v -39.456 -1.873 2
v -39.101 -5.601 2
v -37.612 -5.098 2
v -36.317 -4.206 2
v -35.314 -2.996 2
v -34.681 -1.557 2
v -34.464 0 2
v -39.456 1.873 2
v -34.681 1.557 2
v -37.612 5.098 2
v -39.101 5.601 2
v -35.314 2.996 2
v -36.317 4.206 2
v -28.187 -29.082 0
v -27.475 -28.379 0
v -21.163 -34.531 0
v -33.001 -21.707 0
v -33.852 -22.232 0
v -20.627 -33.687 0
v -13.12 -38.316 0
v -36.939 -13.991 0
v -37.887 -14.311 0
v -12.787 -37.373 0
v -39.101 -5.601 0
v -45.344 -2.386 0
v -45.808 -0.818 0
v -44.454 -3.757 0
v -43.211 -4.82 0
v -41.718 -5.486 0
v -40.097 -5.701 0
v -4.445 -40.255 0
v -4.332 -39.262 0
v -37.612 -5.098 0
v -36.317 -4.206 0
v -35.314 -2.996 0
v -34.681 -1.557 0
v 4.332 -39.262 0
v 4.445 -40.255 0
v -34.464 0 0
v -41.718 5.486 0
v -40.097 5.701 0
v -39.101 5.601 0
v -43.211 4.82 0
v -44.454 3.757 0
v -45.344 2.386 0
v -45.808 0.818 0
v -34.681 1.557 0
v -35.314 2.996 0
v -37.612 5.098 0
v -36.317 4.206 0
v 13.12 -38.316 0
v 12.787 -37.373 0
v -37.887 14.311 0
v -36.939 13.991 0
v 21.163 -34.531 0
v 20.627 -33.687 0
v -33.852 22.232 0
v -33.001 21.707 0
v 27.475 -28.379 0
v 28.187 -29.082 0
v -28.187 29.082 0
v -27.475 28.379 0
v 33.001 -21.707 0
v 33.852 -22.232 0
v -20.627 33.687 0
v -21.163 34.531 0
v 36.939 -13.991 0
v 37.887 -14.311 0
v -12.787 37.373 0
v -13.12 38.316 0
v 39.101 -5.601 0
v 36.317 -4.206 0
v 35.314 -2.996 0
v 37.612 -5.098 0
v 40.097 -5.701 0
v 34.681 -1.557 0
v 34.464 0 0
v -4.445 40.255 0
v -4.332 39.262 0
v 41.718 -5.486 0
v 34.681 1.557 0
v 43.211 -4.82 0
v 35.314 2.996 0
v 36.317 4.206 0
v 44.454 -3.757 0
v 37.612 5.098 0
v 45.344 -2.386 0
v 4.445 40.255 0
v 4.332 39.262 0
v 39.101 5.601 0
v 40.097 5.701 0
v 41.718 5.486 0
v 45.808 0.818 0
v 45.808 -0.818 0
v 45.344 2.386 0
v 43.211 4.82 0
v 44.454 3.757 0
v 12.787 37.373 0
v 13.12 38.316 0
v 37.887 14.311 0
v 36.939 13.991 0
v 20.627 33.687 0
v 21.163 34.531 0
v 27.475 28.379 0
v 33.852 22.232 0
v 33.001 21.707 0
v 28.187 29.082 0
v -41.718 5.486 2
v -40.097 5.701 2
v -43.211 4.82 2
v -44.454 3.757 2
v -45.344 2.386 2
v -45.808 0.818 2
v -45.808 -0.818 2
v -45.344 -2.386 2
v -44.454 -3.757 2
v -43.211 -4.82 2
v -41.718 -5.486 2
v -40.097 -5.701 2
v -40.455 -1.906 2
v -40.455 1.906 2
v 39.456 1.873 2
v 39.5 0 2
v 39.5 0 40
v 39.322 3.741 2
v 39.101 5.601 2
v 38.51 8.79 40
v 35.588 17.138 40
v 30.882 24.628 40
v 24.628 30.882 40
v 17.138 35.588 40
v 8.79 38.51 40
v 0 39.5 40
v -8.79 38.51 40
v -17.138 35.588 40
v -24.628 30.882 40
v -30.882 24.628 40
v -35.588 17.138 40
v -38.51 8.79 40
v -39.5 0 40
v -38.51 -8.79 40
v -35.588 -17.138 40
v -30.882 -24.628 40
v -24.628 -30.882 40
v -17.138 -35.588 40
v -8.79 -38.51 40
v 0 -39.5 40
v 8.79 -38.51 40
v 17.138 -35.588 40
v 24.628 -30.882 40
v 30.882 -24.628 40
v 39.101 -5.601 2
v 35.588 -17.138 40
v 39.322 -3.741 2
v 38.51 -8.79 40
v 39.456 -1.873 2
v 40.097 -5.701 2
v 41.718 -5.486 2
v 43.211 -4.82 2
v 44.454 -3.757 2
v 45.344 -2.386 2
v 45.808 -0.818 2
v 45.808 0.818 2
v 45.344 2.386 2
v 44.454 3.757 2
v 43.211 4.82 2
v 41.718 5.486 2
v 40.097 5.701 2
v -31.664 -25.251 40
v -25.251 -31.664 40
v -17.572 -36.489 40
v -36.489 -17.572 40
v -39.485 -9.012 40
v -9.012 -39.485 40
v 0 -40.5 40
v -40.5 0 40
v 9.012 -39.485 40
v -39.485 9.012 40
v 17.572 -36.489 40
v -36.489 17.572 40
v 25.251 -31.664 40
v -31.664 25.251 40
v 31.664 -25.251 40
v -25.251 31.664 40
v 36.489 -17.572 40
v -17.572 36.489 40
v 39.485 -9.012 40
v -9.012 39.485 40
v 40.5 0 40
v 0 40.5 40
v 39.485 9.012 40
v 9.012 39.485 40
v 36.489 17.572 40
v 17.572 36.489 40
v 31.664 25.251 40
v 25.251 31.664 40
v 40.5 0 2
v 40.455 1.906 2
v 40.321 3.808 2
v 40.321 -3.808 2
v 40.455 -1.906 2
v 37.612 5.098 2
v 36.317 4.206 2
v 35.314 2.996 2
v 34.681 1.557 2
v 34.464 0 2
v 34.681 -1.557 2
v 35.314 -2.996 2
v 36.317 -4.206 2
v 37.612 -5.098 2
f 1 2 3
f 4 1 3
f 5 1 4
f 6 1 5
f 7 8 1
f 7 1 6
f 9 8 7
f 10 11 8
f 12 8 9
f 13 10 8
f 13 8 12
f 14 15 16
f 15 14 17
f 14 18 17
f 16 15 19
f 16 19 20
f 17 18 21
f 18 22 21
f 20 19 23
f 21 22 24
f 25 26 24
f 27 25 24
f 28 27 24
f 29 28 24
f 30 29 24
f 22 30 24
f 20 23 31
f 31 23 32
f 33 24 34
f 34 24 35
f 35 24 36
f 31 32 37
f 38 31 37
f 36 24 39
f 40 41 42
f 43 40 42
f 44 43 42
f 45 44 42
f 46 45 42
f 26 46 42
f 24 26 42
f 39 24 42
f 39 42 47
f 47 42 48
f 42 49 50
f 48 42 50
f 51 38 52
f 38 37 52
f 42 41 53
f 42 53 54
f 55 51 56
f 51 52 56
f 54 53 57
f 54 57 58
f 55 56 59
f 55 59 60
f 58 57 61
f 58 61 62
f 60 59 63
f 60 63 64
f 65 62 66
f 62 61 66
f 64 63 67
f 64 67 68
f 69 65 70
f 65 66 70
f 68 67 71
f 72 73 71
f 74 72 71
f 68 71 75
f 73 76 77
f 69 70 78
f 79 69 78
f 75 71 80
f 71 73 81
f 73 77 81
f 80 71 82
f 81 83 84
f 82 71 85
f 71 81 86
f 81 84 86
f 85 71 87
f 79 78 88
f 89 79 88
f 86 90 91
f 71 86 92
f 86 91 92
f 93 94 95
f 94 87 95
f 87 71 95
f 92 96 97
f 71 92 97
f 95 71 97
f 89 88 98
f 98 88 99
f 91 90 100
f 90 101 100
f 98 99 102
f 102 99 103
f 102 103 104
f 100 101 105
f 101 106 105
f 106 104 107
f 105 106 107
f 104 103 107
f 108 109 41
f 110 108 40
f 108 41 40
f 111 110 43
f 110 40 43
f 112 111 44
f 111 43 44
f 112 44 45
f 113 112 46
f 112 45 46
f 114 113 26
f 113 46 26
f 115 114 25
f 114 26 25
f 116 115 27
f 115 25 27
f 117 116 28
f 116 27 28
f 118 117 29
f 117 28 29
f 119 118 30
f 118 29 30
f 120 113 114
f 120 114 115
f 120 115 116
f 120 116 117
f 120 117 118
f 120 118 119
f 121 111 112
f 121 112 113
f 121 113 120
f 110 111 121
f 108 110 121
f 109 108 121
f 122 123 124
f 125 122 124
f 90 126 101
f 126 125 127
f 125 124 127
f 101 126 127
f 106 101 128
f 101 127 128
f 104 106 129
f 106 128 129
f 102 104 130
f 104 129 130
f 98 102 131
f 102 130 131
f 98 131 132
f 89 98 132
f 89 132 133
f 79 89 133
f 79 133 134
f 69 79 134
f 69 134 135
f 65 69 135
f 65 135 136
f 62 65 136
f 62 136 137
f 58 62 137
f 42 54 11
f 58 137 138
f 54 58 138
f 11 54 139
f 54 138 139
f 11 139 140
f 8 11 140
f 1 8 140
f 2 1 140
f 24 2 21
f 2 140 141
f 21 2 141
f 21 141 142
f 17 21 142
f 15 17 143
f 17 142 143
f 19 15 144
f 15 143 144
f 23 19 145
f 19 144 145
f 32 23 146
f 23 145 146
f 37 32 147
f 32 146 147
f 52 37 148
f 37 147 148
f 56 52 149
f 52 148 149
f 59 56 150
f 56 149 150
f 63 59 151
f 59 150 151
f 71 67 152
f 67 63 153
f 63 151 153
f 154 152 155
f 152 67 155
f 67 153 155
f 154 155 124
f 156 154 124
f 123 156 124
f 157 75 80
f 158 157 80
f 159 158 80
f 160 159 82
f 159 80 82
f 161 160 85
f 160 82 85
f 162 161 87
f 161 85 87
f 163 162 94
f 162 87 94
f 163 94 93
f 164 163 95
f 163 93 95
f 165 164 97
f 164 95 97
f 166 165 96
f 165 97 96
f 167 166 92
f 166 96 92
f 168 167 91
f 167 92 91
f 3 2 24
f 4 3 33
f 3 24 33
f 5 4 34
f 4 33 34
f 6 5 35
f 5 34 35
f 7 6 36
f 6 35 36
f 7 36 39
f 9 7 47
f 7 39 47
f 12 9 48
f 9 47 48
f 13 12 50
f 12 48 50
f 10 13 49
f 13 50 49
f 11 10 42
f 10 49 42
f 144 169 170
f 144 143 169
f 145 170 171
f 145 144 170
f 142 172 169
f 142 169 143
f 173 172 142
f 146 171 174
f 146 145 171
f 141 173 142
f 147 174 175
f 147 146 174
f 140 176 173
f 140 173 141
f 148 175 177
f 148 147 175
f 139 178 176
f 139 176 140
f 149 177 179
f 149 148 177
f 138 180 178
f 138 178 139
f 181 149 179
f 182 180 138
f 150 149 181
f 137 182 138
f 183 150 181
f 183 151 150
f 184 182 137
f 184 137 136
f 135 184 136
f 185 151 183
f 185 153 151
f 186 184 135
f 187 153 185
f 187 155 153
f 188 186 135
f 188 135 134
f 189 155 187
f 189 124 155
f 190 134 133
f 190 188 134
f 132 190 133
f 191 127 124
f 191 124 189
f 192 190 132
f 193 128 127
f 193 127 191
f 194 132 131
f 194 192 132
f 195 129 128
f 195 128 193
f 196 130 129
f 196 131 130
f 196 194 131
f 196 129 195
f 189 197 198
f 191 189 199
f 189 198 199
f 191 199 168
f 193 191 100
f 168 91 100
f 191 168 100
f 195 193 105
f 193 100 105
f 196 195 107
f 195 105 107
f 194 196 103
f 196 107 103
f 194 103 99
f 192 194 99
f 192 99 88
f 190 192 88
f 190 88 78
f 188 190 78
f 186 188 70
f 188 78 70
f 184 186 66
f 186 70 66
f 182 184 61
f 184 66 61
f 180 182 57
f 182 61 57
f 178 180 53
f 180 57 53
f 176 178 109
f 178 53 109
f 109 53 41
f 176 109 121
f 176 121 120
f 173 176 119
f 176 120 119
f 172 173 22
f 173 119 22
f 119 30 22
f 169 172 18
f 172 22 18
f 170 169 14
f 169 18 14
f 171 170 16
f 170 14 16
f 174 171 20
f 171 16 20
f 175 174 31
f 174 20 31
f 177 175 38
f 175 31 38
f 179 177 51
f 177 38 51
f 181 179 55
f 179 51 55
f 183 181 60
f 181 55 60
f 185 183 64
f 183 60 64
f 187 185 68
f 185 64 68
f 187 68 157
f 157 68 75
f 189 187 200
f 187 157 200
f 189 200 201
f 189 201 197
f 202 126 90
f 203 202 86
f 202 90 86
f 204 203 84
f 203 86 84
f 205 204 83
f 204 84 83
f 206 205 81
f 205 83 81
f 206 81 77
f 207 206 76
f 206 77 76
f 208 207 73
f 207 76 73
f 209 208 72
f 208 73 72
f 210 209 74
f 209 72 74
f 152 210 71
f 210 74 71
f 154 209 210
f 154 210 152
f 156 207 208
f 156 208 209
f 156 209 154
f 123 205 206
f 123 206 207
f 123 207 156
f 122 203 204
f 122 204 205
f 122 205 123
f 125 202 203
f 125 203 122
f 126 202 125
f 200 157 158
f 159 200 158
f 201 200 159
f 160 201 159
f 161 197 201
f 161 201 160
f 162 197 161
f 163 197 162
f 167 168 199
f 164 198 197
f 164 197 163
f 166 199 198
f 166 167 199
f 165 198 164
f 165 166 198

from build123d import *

# Parameters (mm, degrees)
F0_R     = 40.5
F1_DEPTH = 40
F2_R     = 39.5
F3_DEPTH = 42
F4_R     = 5.70155
F5_DEPTH = 2


with BuildPart() as f1:
    # F0 (on Top) → F1 (new body)
    with BuildSketch(Plane.XY):
        Circle(F0_R)
    extrude(amount=F1_DEPTH)

    # F2 (on face) → F3 (cut)
    with BuildSketch(Plane.XY.offset(40)):
        Circle(F2_R)
    extrude(amount=-F3_DEPTH, mode=Mode.SUBTRACT)

    # F4 (on Top) → F5 (join)
    with BuildSketch(Plane.XY):
        with Locations((-40.165663, 0)):
            Circle(F4_R)
        with Locations((40.165663, 0)):
            Circle(F4_R)
    extrude(amount=F5_DEPTH)


solid = f1.part
